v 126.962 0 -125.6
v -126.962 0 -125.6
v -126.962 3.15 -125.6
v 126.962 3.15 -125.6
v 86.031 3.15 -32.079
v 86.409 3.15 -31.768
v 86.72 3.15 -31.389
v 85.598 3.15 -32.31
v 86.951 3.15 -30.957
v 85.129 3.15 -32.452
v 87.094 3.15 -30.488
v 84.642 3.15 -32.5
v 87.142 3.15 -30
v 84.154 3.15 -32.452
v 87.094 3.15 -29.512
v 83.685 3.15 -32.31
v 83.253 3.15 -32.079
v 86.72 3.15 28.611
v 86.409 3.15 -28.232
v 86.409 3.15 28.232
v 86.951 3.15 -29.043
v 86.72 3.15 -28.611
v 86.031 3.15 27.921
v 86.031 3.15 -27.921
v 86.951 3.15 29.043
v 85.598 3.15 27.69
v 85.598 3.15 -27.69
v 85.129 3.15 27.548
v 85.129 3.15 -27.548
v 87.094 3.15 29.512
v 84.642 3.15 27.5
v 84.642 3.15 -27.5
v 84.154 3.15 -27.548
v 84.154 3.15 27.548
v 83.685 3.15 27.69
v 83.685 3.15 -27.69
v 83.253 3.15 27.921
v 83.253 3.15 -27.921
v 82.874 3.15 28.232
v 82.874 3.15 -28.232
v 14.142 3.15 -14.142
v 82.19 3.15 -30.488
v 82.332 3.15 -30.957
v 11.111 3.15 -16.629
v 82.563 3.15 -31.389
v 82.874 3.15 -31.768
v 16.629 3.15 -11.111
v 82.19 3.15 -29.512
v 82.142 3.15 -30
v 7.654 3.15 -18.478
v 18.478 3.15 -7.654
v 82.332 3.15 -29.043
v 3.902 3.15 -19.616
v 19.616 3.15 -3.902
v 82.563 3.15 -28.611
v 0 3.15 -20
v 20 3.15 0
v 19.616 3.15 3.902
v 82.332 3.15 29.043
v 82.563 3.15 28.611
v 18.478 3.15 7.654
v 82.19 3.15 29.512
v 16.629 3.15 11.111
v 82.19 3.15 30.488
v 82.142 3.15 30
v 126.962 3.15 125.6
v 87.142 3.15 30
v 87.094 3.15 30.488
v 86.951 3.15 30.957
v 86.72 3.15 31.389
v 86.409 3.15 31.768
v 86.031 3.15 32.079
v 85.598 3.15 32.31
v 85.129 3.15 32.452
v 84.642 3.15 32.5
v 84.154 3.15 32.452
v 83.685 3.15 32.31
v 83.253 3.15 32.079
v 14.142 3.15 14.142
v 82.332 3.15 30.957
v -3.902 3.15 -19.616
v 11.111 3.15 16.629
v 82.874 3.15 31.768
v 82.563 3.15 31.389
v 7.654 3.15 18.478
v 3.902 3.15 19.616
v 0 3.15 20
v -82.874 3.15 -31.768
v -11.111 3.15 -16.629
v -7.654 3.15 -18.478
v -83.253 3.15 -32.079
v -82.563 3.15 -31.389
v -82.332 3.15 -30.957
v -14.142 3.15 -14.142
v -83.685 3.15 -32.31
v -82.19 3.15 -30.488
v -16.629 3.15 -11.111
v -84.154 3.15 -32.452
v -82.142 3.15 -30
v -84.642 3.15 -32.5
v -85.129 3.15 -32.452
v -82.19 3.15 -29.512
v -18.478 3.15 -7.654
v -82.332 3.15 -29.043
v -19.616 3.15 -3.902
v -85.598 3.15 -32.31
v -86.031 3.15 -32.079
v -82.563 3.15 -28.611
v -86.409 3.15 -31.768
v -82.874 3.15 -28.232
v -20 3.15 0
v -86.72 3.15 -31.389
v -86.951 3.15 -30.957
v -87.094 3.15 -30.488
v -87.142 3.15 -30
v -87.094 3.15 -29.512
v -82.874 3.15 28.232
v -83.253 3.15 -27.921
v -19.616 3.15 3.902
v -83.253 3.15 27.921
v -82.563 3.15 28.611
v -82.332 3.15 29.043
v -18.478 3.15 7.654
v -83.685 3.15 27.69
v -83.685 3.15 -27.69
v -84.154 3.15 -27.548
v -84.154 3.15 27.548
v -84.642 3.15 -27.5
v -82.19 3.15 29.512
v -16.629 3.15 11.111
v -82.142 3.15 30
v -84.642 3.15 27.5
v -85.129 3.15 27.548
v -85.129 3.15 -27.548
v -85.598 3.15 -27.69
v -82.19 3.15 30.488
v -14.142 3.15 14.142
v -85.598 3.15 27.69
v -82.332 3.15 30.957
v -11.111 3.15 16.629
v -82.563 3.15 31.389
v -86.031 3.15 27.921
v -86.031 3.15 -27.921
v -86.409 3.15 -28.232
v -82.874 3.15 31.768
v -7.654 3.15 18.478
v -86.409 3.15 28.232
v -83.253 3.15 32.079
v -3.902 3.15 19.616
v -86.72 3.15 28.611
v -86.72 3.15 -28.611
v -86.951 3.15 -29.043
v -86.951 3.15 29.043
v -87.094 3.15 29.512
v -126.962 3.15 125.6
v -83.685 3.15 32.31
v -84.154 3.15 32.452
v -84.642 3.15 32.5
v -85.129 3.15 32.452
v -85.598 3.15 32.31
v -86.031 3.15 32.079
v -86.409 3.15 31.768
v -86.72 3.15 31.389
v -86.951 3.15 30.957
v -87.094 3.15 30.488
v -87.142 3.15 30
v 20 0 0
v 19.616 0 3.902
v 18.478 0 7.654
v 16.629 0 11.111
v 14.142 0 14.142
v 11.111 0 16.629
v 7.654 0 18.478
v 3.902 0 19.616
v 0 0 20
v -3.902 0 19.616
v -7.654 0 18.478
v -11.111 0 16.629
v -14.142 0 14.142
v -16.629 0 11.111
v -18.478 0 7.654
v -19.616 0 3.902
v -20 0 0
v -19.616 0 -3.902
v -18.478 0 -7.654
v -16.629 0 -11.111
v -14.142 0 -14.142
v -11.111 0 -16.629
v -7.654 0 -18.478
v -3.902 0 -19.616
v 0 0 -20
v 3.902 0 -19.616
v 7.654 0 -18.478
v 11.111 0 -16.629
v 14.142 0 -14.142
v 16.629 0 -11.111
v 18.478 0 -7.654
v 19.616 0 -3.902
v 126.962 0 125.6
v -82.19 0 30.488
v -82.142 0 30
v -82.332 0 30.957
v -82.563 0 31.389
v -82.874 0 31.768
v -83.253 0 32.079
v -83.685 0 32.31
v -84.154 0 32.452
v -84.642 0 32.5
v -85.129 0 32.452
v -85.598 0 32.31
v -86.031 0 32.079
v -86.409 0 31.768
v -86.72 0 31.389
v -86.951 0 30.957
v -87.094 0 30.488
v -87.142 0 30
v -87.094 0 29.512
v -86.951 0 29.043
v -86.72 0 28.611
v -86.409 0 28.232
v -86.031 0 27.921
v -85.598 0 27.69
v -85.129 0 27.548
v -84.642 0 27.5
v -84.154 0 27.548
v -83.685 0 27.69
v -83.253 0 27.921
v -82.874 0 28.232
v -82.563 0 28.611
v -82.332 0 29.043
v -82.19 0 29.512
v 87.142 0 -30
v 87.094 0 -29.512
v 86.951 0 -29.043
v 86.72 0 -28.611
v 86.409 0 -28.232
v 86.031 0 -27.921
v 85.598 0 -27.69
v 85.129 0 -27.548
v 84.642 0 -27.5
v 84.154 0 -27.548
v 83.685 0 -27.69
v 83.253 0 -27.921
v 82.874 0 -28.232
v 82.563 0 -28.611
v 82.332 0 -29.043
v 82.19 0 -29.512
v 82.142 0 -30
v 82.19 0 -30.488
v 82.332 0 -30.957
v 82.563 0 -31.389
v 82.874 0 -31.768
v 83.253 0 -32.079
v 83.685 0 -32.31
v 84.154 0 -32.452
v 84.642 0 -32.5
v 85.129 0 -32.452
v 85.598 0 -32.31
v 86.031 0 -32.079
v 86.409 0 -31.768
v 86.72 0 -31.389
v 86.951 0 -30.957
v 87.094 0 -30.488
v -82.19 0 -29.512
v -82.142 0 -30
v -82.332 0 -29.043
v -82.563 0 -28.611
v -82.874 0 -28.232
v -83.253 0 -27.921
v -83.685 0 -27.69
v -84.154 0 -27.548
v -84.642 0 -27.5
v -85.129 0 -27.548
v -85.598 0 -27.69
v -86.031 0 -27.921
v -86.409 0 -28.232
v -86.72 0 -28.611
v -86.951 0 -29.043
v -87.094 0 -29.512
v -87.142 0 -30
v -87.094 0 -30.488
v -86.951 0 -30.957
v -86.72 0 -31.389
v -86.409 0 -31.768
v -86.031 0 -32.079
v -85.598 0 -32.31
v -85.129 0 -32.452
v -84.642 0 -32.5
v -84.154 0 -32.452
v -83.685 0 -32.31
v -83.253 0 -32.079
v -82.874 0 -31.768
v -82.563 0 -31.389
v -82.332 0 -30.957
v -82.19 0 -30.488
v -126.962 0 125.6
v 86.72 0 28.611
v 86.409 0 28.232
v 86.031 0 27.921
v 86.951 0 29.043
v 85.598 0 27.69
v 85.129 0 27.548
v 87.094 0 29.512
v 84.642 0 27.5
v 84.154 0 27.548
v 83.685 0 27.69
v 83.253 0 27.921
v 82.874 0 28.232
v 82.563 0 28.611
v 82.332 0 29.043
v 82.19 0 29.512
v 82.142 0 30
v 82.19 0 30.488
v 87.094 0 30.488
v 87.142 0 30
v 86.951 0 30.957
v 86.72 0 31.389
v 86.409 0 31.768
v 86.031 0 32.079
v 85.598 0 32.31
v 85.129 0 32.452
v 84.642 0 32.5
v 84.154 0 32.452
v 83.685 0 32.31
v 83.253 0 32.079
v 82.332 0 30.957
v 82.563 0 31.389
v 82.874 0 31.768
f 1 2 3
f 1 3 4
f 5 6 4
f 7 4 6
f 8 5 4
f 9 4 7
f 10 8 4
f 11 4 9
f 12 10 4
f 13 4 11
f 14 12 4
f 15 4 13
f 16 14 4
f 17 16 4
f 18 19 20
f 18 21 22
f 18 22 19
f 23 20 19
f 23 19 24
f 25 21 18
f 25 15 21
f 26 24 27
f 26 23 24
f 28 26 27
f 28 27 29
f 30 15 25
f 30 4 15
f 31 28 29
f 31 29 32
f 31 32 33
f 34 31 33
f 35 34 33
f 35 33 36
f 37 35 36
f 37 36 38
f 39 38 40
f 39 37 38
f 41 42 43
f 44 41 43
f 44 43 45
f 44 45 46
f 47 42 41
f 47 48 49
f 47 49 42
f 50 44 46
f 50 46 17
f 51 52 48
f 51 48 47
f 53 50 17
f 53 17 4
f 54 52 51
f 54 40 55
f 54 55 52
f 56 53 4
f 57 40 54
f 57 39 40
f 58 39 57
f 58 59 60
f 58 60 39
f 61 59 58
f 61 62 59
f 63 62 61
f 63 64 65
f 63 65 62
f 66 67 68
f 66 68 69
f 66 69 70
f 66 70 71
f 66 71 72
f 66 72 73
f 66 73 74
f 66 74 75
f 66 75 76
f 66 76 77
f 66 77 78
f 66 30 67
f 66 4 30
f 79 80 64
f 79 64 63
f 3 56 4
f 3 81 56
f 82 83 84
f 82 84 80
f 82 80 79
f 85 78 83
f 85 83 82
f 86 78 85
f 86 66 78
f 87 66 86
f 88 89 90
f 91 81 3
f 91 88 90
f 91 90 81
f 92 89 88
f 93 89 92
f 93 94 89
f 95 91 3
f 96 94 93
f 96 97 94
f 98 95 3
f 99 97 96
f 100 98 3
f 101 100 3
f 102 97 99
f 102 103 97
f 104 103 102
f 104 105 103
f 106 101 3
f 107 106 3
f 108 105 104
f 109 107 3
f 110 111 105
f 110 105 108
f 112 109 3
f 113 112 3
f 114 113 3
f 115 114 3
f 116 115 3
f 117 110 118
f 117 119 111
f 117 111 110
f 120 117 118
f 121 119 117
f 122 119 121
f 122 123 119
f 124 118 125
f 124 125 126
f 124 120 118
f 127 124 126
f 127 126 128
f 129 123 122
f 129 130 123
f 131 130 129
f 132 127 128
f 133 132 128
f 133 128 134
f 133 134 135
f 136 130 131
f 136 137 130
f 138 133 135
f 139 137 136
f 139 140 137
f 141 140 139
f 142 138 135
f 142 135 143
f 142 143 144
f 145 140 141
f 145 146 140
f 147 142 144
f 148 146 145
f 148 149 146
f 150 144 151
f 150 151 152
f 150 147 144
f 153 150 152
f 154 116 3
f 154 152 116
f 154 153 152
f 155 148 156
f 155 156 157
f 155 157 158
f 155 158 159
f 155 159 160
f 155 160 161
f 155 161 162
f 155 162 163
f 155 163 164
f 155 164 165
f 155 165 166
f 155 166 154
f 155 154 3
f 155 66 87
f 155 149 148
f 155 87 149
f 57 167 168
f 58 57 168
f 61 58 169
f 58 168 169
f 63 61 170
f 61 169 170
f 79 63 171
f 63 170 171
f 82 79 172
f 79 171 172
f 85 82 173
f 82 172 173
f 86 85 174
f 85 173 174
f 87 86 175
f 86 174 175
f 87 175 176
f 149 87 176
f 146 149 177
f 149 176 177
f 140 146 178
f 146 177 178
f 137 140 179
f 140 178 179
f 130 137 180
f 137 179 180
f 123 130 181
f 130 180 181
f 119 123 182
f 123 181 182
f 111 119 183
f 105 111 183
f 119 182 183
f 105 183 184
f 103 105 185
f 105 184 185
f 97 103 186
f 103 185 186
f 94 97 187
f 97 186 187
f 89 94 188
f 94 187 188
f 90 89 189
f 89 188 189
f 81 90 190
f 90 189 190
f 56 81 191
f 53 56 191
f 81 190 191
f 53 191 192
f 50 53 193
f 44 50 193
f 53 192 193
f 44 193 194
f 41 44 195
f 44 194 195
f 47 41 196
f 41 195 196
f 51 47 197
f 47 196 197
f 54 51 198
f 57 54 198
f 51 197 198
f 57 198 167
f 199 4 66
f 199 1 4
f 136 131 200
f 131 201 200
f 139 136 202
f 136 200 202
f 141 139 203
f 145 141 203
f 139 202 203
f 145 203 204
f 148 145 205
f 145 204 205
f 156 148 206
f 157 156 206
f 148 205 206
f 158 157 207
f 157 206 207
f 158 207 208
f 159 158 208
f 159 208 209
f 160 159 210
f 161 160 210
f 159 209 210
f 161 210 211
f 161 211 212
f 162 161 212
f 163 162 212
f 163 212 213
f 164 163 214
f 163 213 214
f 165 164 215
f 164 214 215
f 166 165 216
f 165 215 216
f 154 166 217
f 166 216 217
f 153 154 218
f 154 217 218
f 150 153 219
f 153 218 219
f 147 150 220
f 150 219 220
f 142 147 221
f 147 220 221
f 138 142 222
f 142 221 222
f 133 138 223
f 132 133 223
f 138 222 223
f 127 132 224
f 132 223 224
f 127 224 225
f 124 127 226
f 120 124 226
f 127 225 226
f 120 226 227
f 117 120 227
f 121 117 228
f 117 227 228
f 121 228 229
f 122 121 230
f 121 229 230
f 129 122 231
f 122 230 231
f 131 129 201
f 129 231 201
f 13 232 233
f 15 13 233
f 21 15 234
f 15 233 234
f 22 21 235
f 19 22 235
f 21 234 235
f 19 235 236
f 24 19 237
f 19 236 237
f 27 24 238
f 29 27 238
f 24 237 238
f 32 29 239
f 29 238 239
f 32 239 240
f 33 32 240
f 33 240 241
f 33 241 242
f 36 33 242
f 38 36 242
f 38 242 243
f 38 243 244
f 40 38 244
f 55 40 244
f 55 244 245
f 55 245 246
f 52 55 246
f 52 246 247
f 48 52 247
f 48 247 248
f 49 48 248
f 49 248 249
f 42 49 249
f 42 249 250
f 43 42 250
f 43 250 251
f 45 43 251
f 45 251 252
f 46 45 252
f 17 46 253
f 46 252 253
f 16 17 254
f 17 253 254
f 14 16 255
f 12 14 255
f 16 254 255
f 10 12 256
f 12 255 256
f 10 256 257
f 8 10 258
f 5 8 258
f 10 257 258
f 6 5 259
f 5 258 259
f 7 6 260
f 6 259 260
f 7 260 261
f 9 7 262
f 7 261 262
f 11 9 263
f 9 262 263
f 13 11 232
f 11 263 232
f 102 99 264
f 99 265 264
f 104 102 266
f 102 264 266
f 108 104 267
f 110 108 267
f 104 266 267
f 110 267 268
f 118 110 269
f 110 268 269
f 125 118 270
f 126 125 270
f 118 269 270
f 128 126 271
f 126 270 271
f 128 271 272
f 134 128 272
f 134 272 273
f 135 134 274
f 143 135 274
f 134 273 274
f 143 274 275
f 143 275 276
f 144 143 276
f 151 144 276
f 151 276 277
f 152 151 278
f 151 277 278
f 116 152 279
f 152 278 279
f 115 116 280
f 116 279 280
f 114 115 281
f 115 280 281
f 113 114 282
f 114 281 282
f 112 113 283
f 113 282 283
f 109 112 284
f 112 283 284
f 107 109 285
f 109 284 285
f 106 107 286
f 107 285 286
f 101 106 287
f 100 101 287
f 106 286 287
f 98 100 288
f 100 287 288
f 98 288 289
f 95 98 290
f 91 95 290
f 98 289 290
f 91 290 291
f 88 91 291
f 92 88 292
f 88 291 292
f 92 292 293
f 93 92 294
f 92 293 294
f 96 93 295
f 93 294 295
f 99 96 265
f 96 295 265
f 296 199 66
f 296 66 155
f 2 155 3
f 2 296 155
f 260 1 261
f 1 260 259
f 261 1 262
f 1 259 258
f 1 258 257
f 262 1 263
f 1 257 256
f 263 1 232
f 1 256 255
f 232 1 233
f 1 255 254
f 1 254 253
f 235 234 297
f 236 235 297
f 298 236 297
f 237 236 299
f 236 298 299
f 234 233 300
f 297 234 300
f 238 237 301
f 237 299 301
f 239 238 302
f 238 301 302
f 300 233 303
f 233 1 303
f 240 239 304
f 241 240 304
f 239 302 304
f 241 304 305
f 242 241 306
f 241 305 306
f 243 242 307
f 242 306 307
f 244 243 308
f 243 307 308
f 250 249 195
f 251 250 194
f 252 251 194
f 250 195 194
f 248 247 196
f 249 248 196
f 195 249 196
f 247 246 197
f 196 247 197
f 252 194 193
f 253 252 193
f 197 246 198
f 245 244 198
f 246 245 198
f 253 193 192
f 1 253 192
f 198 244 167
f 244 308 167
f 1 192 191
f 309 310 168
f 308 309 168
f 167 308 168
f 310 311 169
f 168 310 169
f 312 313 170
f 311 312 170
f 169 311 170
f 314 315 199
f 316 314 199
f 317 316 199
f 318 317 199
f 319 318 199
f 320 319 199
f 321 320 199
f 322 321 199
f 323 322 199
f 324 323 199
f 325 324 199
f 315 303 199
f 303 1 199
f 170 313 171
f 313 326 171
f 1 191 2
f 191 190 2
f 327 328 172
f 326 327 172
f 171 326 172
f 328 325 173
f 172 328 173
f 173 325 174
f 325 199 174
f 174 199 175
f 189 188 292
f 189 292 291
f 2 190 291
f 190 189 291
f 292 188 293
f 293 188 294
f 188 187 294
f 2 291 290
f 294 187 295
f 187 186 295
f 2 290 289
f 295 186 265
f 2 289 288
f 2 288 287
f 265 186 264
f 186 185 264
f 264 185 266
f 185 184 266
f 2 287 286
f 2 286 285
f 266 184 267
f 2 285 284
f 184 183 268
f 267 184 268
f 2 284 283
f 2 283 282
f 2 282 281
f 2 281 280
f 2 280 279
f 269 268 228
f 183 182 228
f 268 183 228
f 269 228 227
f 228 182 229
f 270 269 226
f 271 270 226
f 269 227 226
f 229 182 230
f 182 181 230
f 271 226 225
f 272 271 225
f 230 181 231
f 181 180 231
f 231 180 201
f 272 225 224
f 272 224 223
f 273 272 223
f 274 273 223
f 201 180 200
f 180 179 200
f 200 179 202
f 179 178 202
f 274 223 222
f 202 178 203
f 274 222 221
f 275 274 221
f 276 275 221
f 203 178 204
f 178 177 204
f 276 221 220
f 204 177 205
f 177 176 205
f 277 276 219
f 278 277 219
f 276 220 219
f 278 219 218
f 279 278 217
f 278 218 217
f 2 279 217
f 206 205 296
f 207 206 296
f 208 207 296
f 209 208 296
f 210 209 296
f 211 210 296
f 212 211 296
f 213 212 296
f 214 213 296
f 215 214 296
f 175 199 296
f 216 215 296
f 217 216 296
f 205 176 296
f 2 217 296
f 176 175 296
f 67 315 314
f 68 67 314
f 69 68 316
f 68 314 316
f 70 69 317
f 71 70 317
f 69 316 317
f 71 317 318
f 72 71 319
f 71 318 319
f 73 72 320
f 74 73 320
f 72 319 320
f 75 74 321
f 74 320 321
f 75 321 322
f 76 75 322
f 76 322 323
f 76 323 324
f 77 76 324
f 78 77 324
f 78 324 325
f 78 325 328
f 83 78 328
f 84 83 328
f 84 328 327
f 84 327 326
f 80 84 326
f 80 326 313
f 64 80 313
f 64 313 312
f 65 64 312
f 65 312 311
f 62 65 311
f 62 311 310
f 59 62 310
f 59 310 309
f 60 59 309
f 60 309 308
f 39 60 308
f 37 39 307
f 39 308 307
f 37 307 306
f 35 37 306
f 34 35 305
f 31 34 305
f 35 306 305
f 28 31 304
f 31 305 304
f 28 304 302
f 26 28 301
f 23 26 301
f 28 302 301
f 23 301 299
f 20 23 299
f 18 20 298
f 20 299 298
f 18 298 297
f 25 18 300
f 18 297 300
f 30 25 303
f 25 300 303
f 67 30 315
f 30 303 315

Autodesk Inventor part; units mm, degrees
ref_plane "YZ Plane" through (0, 0, 0) normal (1, 0, 0) x (0, 1, 0)
ref_plane "XZ Plane" through (0, 0, 0) normal (0, 1, 0) x (-1, 0, 0)
ref_plane "XY Plane" through (0, 0, 0) normal (0, 0, 1) x (1, 0, 0)
sketch "Sketch1" plane through (0, 0, 0) normal (0, 1, 0) x (-1, 0, 0)
  line L0 (126.9625, -125.6) -> (-126.9625, -125.6)
  line L1 (-126.9625, -125.6) -> (-126.9625, 125.6)
  line L2 (-126.9625, 125.6) -> (126.9625, 125.6)
  line L3 (126.9625, 125.6) -> (126.9625, -125.6)
  line L4 (126.9625, -125.6) -> (-126.9625, 125.6) construction
  line L5 (-126.9625, -125.6) -> (126.9625, 125.6) construction
  point P0 (0, 0)
  dimension "d0" = 253.925
  dimension "d1" = 251.2
extrude "Extrusion1" add sketch "Sketch1" along normal blind 3.15
sketch "Sketch4" plane through (0, 0, 0) normal (0, -1, 0) x (1, 0, 0)
  line L0 (-126.9625, 125.6) -> (-126.9625, -125.6) projected
  line L1 (126.9625, -40) -> (-126.9625, -40)
  line L2 (-126.9625, -40) -> (-126.9625, 40)
  line L3 (-126.9625, 40) -> (126.9625, 40)
  line L4 (126.9625, 40) -> (126.9625, -40)
  line L5 (126.9625, -40) -> (-126.9625, 40) construction
  line L6 (-126.9625, -40) -> (126.9625, 40) construction
  circle A0 centre (-84.6417, 30) radius 2.5
  line L7 (0, 0) -> (-126.9625, 0)
  line L8 (-126.9625, 0) -> (-126.9625, 40)
  line L9 (-126.9625, 40) -> (0, 40)
  line L10 (0, 40) -> (0, 0)
  circle A1 centre (-84.6417, -30) radius 2.5
  circle A2 centre (84.6417, 30) radius 2.5
  circle A3 centre (84.6417, -30) radius 2.5
  circle A4 centre (0, 0) radius 20
  dimension "d20" = 80
  dimension "d21" = 5
  dimension "d22" = 10
  dimension "d23" = 84.6417
  dimension "d24" = 40
extrude "Extrusion4" cut sketch "Sketch4" against normal up to next contours A4 L10 L7 | L7 L10 A4 | A0 | A1 | A2 | A3
equation "\"d0\" = visor_x"
equation "\"d1\" = 2 * visor_y + frame_y"
equation "\"d2\" = clear_acrylic"
equation "\"d20\" = frame_y"
equation "\"d21\" = m5_diameter"
equation "\"d22\" = 0.5 * visor_overlap"
equation "\"d23\" = 0.333333 * visor_x"
equation "\"d24\" = 0.5 * frame_y"
equation "\"sm_thickness\" = 1.5875"
equation "\"very_thick_acrylic\" = 9.45"
equation "\"thick_acrylic\" = 5.88"
equation "\"thin_acrylic\" = 3.15"
equation "\"clear_acrylic\" = 3.15"
equation "\"wood_thickness\" = 6.72"
equation "\"m3_diameter\" = 3"
equation "\"m4_diameter\" = 4"
equation "\"m5_diameter\" = 5"
equation "\"brass_insert_drill\" = 4"
equation "\"m5_brass_insert_drill\" = 6.7"
equation "\"m3_main_length\" = 14"
equation "\"m3_main_nut_width\" = 5.7"
equation "\"m3_main_nut_thickness\" = 2.5"
equation "\"m3_main_extra\" = 1"
equation "\"stepper_screw_space\" = 35"
equation "\"stepper_shaft_diameter\" = 5"
equation "\"stepper_body_diameter\" = 28"
equation "\"laser_body_diameter\" = 12"
equation "\"t_carrier\" = 5.88"
equation "\"t_wall\" = 5.88"
equation "\"t_window\" = 3.15"
equation "\"carrier_y\" = 251"
equation "\"carrier_z\" = 12"
equation "\"carrier_z2\" = 25"
equation "\"protection_slot\" = 44.2"
equation "\"protection_slot_offset\" = 55.25"
equation "\"window_z\" = 332.225"
equation "\"window_y\" = 93.75"
equation "\"door_sensor\" = 35"
equation "\"reservoir_x\" = 201"
equation "\"reservoir_y\" = 201"
equation "\"linear_bearing_spacing\" = 271"
equation "\"motor_spacing\" = 337"
equation "\"t_tray\" = 3.15"
equation "\"tray_border\" = 25"
equation "\"tray_x\" = 251"
equation "\"tray_y\" = 251"
equation "\"bed_z\" = 25"
equation "\"brass_keep_out\" = 8"
equation "\"tape_keep_out\" = 2"
equation "\"tape_thickness\" = 2"
equation "\"t_crane\" = 6.72"
equation "\"crane_z2\" = 12"
equation "\"end_stop_spacing\" = 19"
equation "\"thumb_nut_offset_y\" = 0"
equation "\"thumb_nut_diameter\" = 7"
equation "\"z_min_from_center\" = 115"
equation "\"t_frame\" = 6.72"
equation "\"frame_top_z\" = 385"
equation "\"frame_bottom_z\" = 275"
equation "\"frame_total_z\" = 661.5875"
equation "\"frame_y\" = 80"
equation "\"frame_border\" = 48.0375"
equation "\"frame_foot_z\" = 12"
equation "\"frame_tilt\" = 1deg"
equation "\"printer_z\" = 289"
equation "\"lcd_x\" = 72"
equation "\"lcd_y\" = 25"
equation "\"subframe_x\" = 66"
equation "\"subframe_y_offset\" = 27.5"
equation "\"laser_y_offset\" = 19.4"
equation "\"laser_diameter\" = 12"
equation "\"laser_z_offset\" = 55"
equation "\"laser_y\" = 15"
equation "\"laser_z\" = 75"
equation "\"t_galvo_frame\" = 6.72"
equation "\"galvo_frame_x\" = 66"
equation "\"galvo_frame_z\" = 85"
equation "\"galvo_frame_y_offset\" = 27.5"
equation "\"drawer_x\" = 257.3"
equation "\"drawer_y\" = 90.3375"
equation "\"drawer_z\" = 278.175"
equation "\"drawer_z_from_bottom\" = 25"
equation "\"nema17_x\" = 43"
equation "\"visor_y\" = 85.6"
equation "\"visor_x\" = 253.925"
equation "\"door_z\" = 332.225"
equation "\"door_x\" = 251"
equation "\"window_overlap\" = 48"
equation "\"door_overlap\" = 48"
equation "\"acrylic_into_frame\" = 5"
equation "\"m3_press_nut_drill\" = 4.5"
equation "\"m3_head\" = 6"
equation "\"m5_head\" = 10.3"
equation "\"m5_press_nut_drill\" = 6.5"
equation "\"drawer_support_from_top\" = 48"
equation "\"laser_gap\" = 1"
equation "\"frame_screw_from_center\" = 25"
equation "\"drawer_screw_from_center\" = 55"
equation "\"frame_face_y\" = 45"
equation "\"switch_spacing\" = 19"
equation "\"subframe_y\" = 55"
equation "\"al_thickness\" = 1.5875"
equation "\"rivet_diameter\" = 3.3"
equation "\"bend_factor\" = 2.26205"
equation "\"al_bend\" = 3.591"
equation "\"sm_bend\" = 3.591"
equation "\"frame_x\" = 353.375"
equation "\"carrier_y2\" = 76.825"
equation "\"visor_overlap\" = 20"
properties part number "visor"
